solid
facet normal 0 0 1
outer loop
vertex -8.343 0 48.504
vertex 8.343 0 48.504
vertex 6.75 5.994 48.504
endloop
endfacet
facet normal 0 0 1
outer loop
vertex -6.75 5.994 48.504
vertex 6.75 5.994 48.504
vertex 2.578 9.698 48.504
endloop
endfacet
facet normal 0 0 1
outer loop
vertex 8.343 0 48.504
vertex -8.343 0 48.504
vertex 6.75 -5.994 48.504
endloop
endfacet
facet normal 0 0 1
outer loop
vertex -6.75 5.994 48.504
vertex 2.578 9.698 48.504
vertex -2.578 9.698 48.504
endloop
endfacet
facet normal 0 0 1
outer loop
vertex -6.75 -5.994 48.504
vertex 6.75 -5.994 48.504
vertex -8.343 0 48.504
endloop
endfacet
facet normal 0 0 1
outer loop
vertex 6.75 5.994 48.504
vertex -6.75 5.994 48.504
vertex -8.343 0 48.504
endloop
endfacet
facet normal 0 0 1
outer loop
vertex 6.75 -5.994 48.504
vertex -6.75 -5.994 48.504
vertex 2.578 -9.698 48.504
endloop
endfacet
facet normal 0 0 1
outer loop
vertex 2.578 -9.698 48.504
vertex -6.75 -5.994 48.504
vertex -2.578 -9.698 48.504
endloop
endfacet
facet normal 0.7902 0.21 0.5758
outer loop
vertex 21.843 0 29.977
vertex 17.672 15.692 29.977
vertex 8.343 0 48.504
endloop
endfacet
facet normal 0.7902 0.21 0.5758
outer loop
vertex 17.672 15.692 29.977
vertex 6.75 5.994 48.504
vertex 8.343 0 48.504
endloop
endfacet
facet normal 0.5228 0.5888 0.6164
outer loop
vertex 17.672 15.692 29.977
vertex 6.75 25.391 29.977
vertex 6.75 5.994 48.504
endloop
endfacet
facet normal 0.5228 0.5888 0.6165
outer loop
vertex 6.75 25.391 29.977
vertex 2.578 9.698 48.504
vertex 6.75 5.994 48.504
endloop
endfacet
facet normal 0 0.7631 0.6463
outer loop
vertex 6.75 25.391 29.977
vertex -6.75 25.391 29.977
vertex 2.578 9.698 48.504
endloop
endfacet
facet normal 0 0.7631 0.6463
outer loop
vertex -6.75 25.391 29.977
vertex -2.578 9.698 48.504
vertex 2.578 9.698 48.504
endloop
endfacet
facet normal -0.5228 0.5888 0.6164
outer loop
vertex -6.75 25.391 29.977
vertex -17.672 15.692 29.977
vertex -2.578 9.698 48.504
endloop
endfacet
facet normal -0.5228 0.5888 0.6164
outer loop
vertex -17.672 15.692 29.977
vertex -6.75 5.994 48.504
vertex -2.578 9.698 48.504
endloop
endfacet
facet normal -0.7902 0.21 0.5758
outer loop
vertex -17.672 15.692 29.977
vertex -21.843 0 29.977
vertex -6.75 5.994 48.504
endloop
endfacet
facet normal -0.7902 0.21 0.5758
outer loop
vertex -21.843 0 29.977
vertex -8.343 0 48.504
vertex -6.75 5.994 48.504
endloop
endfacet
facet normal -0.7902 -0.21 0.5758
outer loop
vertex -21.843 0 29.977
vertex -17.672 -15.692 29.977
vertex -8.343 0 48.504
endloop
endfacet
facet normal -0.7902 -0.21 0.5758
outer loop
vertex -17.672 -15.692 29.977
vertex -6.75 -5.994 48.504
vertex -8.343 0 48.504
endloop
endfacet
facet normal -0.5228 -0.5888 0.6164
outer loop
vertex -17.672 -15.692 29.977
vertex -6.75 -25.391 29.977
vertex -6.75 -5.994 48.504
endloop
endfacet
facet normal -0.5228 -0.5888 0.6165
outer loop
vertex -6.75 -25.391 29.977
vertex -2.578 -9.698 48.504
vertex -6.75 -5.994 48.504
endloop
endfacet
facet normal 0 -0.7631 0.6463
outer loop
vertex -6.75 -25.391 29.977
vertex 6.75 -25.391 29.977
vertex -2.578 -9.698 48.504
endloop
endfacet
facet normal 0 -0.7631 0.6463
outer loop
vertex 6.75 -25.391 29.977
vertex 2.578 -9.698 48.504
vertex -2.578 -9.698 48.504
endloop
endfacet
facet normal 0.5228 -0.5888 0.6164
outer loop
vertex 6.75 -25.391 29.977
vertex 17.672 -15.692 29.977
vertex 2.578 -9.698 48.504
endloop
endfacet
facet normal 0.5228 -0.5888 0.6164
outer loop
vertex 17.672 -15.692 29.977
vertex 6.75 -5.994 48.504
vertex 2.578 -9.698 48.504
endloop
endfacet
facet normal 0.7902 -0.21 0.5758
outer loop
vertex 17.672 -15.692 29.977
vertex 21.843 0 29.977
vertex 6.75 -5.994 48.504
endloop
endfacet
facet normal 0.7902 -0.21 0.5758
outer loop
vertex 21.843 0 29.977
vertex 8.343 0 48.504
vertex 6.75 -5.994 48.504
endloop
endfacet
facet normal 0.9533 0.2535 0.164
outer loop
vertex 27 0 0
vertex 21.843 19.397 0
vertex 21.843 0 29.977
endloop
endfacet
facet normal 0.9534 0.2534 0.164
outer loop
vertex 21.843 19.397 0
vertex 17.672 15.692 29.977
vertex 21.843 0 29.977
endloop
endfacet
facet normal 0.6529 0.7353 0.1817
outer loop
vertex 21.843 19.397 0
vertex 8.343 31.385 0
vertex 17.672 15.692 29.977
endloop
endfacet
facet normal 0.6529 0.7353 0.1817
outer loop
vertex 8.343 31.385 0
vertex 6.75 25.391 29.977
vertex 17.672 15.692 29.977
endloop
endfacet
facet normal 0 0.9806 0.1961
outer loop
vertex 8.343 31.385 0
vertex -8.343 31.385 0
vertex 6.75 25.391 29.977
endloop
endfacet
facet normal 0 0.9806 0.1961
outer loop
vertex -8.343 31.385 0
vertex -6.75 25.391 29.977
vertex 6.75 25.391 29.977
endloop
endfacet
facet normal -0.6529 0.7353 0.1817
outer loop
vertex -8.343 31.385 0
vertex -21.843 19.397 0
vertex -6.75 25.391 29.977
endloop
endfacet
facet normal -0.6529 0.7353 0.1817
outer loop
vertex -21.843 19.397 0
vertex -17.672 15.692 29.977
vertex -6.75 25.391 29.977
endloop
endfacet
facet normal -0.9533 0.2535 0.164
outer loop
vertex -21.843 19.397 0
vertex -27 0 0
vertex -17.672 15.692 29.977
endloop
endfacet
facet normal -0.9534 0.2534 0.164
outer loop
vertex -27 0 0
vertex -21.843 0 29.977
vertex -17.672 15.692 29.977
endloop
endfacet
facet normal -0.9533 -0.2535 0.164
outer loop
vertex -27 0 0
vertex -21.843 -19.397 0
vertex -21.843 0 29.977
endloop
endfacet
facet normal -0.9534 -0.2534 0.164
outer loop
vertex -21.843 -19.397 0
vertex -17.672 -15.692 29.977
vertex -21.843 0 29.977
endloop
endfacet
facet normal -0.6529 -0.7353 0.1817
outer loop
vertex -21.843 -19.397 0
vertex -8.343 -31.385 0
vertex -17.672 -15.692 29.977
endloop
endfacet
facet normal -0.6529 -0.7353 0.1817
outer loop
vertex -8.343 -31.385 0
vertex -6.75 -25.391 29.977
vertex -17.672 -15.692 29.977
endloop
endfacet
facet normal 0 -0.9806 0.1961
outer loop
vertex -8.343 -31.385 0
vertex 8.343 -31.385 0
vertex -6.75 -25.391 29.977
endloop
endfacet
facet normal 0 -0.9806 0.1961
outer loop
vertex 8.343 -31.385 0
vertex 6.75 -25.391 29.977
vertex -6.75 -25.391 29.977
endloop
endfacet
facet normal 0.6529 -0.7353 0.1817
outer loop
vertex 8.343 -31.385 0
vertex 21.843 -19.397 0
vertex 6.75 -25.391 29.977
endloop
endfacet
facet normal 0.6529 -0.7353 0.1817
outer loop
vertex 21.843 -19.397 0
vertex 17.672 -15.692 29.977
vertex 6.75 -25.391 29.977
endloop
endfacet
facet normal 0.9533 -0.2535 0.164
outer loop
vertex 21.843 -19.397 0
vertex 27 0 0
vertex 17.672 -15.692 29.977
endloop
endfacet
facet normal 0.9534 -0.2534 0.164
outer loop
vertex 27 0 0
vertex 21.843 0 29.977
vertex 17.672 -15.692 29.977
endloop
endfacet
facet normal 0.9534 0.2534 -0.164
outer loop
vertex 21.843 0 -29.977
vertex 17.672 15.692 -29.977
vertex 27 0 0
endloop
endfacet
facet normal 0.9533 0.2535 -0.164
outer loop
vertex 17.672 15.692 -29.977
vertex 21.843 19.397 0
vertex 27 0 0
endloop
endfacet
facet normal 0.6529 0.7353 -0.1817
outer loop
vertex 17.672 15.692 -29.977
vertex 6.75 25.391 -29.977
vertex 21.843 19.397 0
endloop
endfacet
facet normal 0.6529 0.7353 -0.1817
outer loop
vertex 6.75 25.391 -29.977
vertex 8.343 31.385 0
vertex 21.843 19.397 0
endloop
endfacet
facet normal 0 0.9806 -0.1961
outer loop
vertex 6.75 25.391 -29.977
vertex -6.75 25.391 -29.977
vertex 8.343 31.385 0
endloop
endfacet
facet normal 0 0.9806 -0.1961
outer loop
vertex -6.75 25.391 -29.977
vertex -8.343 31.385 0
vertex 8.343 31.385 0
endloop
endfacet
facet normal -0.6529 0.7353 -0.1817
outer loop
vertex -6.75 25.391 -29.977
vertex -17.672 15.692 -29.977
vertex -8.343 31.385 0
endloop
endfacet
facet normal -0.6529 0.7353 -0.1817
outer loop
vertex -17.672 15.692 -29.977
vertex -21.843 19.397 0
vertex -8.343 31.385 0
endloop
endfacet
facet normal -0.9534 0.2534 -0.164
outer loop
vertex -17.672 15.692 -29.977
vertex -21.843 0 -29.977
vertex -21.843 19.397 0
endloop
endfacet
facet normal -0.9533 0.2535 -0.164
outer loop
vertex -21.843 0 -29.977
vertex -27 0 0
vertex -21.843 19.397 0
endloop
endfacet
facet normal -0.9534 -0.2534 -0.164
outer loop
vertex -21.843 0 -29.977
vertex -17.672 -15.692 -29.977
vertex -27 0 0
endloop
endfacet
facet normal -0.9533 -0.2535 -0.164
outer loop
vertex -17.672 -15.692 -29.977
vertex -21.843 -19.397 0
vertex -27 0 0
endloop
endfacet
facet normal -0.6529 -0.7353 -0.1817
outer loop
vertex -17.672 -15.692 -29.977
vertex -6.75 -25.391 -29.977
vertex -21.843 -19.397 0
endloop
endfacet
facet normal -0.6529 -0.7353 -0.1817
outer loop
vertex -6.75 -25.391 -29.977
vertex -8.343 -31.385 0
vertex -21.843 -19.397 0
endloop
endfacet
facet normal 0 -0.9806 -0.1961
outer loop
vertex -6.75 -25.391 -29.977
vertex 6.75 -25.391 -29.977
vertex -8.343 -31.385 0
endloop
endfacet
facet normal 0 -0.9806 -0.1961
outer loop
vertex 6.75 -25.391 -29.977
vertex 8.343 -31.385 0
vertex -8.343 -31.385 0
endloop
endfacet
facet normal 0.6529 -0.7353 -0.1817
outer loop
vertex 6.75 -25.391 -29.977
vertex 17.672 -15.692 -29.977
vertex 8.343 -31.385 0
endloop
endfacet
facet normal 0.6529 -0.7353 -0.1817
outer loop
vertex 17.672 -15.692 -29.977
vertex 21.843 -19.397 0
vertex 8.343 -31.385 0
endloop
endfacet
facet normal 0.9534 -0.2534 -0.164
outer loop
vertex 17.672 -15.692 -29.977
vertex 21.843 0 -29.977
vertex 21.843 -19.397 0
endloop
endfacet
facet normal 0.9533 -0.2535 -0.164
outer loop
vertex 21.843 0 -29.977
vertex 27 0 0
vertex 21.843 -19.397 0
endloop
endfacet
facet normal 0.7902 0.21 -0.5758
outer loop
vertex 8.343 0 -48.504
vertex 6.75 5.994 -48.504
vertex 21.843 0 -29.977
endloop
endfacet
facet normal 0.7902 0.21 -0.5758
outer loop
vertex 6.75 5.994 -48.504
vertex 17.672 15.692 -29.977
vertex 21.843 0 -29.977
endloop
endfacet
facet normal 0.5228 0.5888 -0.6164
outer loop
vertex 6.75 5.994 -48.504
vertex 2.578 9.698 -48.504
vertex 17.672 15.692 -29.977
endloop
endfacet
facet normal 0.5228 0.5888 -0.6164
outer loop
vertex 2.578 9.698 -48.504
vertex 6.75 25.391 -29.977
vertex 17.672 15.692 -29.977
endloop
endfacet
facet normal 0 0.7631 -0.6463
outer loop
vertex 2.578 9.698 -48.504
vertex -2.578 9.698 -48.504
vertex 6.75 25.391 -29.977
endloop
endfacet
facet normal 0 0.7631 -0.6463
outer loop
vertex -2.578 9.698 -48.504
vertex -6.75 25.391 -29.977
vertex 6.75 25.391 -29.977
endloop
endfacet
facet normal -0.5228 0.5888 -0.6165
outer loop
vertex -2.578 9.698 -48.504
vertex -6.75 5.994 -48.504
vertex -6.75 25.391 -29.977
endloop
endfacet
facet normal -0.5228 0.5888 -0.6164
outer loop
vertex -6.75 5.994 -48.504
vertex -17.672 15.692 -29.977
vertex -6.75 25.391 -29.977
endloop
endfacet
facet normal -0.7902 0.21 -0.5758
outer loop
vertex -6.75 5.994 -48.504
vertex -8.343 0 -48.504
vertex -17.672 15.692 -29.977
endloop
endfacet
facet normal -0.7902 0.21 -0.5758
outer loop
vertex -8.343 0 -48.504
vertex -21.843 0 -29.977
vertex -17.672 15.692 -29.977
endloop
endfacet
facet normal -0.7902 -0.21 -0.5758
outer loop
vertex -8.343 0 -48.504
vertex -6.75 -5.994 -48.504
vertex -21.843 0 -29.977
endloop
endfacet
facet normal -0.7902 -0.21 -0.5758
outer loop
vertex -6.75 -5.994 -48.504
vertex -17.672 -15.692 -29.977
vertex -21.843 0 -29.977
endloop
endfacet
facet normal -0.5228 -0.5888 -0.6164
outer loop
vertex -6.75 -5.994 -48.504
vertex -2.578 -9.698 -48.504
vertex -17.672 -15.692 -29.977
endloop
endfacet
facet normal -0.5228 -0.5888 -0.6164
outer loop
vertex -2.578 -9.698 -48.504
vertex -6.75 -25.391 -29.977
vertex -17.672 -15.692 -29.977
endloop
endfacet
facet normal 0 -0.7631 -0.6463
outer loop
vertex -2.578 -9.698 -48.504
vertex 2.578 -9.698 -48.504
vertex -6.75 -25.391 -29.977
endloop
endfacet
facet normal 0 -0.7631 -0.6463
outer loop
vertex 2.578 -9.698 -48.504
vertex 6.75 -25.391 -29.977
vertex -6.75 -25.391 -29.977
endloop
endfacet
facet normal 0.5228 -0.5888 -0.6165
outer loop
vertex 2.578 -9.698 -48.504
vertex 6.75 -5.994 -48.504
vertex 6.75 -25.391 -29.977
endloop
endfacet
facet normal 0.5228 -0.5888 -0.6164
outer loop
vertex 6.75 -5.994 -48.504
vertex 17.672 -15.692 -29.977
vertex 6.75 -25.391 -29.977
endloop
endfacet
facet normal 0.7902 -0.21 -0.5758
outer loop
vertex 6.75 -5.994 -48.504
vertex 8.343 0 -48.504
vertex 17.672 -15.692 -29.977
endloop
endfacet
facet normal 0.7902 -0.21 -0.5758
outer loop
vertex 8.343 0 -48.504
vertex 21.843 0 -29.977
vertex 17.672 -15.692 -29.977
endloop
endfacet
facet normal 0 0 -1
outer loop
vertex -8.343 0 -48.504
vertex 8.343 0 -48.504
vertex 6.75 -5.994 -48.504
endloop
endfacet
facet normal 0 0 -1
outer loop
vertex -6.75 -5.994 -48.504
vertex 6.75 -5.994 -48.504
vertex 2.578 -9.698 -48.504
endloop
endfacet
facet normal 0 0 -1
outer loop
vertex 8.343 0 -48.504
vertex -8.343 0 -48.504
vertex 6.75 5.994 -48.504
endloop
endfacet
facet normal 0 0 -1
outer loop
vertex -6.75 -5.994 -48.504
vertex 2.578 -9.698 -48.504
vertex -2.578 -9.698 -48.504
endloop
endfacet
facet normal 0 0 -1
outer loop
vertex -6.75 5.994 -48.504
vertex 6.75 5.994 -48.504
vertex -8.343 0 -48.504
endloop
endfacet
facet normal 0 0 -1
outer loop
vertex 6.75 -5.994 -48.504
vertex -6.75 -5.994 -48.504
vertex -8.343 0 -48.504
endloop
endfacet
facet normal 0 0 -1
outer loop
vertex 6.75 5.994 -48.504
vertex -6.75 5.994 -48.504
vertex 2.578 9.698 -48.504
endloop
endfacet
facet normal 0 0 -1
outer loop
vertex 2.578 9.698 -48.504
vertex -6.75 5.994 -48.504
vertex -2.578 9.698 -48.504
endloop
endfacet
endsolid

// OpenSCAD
// Generated by SolidPython 1.0.1 on 2020-07-29 00:46:48


scale(v = [9, 11, 17]) {
	sphere(r = 3);
}
/***********************************************
*********      SolidPython code:      **********
************************************************
 
# import packages: SolidPython
from solid import *
from solid.utils import *
from itertools import chain, combinations, permutations


class Resize:

    def __init__(self, scad_file):
        self.scad_file = scad_file
        #self.scad_file = import_scad(scad_file)
        # cone/cylinder param:
        self.r1 = 0
        self.r2 = 0
        self.h = 0
        # rectangular prism param:
        self.w = 0
        self.l = 0
        # ellipse param:
        self.r = 0

    # import OpenScad code (file name corresponds to shape)


    # classify shape + parameters
    def assign(self, param1, param2, param3):
        if self.scad_file == 'cone.scad':
            self.r1 = param1
            self.r2 = param2
            self.h = param3
        elif self.scad_file == 'cylinder.scad':
            self.r1 = param1
            self.r2 = param2
            self.h = param3
        elif self.scad_file == 'rectangularPrism.scad':
            self.h = param1
            self.l = param2
            self.w = param3
        else:
            self.r = param1
            self.h = param2

    # resize parameters
    def iterate(self):
        x = range(3, 20, 2)
        i = 1
        if self.scad_file == 'cone.scad':
            tempList = list(permutations(x, 2))
            for temp in tempList:
                param1 = temp[0]
                param2 = temp[1]
                filepath = 'produced_scad_files/' + 'cone' + str(param1) + '_' + str(param2) + '_' + '.scad'
                scad_render_to_file(cylinder(h=param1, r1=param2, r2=0), filepath)

        elif self.scad_file == 'cylinder.scad':
            tempList = list(permutations(x, 3))
            for temp in tempList:
                param1 = temp[0]
                param2 = temp[1]
                filepath = 'produced_scad_files/' + 'cylinder' + str(param1) + '_' + str(param2) + '_' + '.scad'
                scad_render_to_file(cylinder(h=param1, r1=param2, r2=param2), filepath)

        elif self.scad_file == 'rectangularPrism.scad':
            tempList = list(permutations(x, 3))
            for temp in tempList:
                param1 = temp[0]
                param2 = temp[1]
                param3 = temp[2]
                filepath = 'produced_scad_files/' + 'rectangularPrism' + str(param1) + '_' + str(param2) + '_' + str(
                    param3) + '.scad'
                scad_render_to_file(cube(size=(param1, param2, param3)), filepath)

        elif self.scad_file == 'ellipse.scad':
            tempList = list(permutations(x, 4))
            for temp in tempList:
                param1 = temp[0]
                param2 = temp[1]
                param3 = temp[2]
                param4 = temp[3]
                filepath = 'produced_scad_files/' + 'ellipse' + str(param1) + '_' + str(param2) + '_' + str(param3) + '_' + str(param4) + '.scad'
                scad_render_to_file(scale([param1, param2, param3])(sphere(r=param4)), filepath)

    def render_to_scadfile(self):
        scad_render_to_file(scad, 'example.scad') 
 
************************************************/
